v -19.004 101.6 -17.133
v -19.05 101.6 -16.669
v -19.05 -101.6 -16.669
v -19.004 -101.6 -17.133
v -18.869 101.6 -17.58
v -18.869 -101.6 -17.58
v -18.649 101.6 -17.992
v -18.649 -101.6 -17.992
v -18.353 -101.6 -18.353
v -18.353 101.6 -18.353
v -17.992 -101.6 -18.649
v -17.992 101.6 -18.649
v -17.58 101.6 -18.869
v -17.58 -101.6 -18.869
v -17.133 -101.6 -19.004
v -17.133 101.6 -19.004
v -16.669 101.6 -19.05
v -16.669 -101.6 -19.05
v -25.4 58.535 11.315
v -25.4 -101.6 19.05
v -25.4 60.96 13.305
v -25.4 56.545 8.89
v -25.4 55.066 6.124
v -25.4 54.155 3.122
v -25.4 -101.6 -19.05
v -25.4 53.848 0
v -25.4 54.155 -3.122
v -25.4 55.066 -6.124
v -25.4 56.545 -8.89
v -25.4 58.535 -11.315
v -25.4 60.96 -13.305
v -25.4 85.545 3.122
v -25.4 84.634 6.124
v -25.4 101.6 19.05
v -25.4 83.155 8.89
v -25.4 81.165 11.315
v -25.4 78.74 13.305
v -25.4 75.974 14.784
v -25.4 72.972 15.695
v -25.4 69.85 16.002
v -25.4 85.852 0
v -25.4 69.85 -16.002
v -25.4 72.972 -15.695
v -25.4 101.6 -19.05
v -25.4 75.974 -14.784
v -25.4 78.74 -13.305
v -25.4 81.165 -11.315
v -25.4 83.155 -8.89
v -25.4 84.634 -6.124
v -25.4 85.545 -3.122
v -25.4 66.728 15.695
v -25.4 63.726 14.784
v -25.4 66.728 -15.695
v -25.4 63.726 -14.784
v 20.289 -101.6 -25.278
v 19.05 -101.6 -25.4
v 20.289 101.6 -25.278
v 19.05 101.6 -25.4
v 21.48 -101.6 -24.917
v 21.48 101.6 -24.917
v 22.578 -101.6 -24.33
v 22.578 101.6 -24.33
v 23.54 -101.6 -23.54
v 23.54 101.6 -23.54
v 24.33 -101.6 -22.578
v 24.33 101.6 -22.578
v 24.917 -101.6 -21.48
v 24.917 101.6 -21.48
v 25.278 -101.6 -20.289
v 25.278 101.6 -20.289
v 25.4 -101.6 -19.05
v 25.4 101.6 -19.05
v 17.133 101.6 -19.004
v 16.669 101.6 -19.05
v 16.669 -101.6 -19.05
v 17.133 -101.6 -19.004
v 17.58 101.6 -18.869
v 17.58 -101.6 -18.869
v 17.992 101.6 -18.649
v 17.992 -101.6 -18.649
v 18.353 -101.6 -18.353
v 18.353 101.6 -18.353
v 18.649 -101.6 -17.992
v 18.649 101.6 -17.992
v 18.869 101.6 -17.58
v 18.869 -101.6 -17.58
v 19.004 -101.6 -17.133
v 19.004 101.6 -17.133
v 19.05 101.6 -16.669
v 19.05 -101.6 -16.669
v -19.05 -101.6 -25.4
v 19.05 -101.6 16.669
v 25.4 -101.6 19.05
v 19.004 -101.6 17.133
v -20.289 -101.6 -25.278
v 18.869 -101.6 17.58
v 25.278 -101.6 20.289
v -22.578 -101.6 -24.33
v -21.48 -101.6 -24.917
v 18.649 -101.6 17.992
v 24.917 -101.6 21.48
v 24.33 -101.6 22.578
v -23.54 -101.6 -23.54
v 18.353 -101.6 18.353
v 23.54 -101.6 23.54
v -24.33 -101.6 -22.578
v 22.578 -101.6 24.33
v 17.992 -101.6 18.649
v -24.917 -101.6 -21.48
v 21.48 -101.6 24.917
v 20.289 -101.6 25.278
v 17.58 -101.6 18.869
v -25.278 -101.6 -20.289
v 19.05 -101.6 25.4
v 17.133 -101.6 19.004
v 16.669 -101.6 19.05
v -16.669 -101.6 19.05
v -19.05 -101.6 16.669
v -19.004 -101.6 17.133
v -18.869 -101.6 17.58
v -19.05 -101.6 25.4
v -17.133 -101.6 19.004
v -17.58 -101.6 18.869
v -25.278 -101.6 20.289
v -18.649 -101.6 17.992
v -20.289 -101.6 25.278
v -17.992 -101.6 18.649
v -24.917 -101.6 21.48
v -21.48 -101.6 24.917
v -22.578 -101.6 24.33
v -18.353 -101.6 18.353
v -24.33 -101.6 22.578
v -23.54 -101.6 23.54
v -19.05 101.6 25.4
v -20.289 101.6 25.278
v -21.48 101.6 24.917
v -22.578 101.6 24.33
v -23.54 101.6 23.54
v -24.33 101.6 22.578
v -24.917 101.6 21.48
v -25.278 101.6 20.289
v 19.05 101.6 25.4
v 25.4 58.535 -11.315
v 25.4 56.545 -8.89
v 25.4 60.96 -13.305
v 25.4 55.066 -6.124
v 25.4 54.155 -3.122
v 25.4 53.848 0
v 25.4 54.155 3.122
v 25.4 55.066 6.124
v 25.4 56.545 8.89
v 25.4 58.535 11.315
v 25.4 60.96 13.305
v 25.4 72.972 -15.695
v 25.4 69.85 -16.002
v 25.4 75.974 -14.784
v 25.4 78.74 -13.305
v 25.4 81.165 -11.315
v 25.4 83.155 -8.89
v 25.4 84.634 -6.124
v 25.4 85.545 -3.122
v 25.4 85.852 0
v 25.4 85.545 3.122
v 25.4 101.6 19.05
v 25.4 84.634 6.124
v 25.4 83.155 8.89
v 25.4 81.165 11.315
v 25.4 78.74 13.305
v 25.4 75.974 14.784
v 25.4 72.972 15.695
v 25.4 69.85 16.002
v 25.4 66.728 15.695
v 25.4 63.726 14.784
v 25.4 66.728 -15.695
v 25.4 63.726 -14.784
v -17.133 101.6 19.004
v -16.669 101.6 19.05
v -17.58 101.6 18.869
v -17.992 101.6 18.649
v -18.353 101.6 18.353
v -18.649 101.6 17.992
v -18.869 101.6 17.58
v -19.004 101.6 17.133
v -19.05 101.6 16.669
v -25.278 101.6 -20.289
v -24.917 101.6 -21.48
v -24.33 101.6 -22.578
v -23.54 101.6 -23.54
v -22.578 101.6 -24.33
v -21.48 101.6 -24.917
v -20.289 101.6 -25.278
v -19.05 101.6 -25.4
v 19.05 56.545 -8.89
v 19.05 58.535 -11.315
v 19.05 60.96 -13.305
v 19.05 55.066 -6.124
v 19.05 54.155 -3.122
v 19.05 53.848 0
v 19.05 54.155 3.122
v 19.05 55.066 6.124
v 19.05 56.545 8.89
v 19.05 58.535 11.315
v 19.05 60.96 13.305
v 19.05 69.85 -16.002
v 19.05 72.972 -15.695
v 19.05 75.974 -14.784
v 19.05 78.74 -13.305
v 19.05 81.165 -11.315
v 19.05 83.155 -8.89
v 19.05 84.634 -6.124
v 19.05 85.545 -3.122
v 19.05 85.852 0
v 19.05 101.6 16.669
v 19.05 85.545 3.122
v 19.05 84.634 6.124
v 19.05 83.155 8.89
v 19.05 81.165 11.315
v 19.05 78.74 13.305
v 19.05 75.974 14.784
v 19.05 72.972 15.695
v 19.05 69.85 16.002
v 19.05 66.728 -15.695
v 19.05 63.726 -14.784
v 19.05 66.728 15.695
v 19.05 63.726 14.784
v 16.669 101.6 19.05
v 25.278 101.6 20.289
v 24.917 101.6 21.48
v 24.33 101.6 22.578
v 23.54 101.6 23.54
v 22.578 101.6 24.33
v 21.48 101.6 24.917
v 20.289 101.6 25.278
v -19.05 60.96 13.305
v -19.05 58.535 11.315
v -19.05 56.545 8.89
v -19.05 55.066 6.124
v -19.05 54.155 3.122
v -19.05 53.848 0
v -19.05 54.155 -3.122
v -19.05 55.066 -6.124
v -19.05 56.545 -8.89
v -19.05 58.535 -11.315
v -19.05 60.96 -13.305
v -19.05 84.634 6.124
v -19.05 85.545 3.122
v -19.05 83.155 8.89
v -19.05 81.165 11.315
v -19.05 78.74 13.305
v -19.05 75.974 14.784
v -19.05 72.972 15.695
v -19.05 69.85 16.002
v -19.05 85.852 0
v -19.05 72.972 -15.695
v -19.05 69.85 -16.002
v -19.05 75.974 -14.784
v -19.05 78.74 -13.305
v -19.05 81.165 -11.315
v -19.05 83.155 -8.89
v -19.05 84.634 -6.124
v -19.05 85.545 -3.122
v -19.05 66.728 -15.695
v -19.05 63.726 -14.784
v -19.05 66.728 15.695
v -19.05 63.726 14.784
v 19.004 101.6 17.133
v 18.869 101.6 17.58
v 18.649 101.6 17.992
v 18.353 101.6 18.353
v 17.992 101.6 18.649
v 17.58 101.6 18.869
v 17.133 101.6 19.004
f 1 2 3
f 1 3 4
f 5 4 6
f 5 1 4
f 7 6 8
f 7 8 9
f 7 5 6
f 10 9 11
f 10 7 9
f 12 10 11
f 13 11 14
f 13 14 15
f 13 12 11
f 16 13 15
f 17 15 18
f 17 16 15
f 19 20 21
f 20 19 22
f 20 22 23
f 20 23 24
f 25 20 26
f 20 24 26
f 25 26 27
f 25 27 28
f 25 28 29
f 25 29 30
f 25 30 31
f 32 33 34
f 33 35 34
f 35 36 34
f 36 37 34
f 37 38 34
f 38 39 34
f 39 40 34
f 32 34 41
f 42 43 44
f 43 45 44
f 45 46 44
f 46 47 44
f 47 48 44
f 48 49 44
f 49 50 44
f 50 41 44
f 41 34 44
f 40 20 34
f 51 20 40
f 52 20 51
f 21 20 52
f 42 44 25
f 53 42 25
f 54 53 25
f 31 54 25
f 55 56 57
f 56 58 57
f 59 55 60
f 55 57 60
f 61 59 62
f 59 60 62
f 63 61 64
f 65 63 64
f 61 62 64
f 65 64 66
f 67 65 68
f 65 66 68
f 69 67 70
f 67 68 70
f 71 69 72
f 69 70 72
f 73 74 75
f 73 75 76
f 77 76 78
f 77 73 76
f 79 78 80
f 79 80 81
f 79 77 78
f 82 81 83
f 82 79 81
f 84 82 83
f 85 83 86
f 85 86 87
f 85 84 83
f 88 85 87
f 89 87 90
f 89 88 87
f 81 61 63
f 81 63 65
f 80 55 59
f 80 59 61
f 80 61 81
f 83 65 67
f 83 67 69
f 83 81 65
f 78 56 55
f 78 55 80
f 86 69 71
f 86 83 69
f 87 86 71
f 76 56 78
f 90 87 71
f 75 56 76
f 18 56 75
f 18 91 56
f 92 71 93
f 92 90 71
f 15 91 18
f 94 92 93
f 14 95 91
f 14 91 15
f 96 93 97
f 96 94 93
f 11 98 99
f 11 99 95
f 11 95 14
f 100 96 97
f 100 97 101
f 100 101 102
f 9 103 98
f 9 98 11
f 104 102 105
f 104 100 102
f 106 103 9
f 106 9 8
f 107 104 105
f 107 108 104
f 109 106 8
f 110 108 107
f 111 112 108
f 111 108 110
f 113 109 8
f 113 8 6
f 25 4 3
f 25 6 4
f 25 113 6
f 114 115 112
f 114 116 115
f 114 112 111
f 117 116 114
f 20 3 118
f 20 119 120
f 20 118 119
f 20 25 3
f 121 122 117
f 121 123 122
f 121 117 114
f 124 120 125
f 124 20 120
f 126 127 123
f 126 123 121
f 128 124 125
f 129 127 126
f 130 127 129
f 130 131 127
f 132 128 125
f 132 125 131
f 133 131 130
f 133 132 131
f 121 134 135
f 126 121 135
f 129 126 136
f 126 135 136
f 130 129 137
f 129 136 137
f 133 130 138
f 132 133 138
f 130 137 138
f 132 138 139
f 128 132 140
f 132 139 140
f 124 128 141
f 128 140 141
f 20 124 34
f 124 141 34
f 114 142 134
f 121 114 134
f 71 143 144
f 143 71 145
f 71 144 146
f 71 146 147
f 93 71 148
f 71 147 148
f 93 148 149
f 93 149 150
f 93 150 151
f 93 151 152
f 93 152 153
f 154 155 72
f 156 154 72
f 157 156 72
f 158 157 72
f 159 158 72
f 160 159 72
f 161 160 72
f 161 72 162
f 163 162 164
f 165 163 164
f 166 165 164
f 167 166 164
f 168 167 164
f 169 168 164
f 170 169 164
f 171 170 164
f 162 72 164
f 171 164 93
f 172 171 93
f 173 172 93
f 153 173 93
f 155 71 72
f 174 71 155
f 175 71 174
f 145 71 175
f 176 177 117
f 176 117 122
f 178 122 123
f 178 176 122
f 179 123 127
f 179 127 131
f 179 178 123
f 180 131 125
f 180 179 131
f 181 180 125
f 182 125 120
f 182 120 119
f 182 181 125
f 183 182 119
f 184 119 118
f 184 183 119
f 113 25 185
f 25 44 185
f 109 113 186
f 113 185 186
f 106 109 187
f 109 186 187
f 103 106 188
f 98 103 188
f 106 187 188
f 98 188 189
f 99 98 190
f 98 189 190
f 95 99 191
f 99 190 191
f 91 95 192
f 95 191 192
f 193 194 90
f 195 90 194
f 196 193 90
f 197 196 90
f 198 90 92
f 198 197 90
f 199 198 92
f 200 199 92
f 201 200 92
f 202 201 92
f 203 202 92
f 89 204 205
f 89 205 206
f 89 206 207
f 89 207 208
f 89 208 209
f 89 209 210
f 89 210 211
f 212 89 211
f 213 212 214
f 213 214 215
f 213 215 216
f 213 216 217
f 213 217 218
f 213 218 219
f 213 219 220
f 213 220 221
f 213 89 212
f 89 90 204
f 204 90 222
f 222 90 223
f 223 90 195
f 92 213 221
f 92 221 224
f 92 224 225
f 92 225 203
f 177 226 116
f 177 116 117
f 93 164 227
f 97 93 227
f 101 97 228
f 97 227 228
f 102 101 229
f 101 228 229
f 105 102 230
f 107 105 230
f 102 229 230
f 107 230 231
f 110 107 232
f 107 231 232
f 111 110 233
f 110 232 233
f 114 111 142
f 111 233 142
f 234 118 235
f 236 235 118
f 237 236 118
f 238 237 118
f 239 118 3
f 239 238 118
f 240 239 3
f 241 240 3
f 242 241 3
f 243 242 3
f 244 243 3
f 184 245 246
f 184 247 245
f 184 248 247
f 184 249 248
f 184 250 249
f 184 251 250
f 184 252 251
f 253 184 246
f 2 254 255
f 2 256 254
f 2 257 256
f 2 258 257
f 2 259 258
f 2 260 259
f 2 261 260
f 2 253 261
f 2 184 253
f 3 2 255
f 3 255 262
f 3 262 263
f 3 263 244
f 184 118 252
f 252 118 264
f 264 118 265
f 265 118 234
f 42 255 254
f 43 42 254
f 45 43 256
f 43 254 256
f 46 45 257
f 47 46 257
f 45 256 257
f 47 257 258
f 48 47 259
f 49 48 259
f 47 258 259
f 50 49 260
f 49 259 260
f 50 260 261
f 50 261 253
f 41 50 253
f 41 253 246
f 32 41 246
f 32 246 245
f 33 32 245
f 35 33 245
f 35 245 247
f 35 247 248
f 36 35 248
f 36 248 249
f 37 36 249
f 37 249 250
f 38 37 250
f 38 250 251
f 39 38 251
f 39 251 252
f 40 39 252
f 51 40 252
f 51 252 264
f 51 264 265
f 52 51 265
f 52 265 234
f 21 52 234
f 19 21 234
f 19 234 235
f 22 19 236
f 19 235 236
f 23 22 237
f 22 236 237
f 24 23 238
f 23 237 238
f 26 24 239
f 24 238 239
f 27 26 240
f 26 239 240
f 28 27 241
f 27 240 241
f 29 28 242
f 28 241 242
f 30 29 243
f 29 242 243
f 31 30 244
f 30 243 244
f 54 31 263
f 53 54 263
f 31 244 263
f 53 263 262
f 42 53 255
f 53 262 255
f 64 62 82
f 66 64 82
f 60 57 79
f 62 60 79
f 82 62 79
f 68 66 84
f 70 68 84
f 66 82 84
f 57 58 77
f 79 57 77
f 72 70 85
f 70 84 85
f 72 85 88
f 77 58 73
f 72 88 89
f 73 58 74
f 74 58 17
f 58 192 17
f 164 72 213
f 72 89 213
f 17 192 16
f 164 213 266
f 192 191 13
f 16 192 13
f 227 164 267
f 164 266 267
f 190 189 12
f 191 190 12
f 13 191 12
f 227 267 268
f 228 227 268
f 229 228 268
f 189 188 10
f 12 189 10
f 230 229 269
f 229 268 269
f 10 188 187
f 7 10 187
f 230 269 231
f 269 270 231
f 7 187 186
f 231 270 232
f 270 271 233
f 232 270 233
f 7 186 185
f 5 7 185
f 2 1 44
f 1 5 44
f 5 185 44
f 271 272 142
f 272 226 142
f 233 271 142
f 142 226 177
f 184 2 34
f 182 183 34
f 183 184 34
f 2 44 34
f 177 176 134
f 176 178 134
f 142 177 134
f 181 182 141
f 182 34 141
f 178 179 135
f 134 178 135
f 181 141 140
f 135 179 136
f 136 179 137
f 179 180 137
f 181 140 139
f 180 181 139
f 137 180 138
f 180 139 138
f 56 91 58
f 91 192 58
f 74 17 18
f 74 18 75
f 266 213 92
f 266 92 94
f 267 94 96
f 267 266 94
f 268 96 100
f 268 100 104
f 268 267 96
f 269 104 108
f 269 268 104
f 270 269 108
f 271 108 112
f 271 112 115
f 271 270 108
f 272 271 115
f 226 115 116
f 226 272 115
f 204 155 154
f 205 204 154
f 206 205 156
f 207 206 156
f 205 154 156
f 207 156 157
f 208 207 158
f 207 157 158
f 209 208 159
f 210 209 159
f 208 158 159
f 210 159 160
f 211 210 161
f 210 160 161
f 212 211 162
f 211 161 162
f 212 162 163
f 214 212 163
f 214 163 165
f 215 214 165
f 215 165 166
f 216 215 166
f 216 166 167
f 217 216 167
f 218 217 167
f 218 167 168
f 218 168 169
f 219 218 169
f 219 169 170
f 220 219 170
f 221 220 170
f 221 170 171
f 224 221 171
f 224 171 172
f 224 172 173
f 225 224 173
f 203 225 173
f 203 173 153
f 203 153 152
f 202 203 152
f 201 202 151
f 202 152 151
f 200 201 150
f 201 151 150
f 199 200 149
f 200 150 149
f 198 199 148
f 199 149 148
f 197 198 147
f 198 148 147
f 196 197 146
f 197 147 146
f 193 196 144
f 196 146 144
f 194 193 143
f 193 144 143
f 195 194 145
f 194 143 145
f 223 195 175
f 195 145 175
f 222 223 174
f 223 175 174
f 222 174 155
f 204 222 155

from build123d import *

# Parameters (mm, degrees)
BOSS_EXTRUDE1_DEPTH = 101.6
SKETCH2_R           = 16.002
CUT_EXTRUDE1_DEPTH  = 51.8


with BuildPart() as part:
    # Sketch1 → Boss-Extrude1 (new body, symmetric)
    with BuildSketch(Plane(origin=(0, 0, 0), x_dir=(0, 0, -1), z_dir=(0, 1, 0))):
        with BuildLine():
            Line((-19.05, 25.4), (19.05, 25.4))
            ThreePointArc((19.05, 25.4), (23.540128061, 23.540128061), (25.4, 19.05))
            Line((25.4, 19.05), (25.4, -19.05))
            ThreePointArc((25.4, -19.05), (23.540128061, -23.540128061), (19.05, -25.4))
            Line((19.05, -25.4), (-19.05, -25.4))
            ThreePointArc((-19.05, -25.4), (-23.540128061, -23.540128061), (-25.4, -19.05))
            Line((-25.4, -19.05), (-25.4, 19.05))
            ThreePointArc((-25.4, 19.05), (-23.540128061, 23.540128061), (-19.05, 25.4))
        make_face()
        with BuildLine():
            Line((-16.66875, 19.05), (16.66875, 19.05))
            ThreePointArc((16.66875, 19.05), (18.352548023, 18.352548023), (19.05, 16.66875))
            Line((19.05, 16.66875), (19.05, -16.66875))
            ThreePointArc((19.05, -16.66875), (18.352548023, -18.352548023), (16.66875, -19.05))
            Line((16.66875, -19.05), (-16.66875, -19.05))
            ThreePointArc((-16.66875, -19.05), (-18.352548023, -18.352548023), (-19.05, -16.66875))
            Line((-19.05, -16.66875), (-19.05, 16.66875))
            ThreePointArc((-19.05, 16.66875), (-18.352548023, 18.352548023), (-16.66875, 19.05))
        make_face(mode=Mode.SUBTRACT)
    extrude(amount=BOSS_EXTRUDE1_DEPTH, both=True)

    # Sketch2 → Cut-Extrude1 (cut, through all)
    with BuildSketch(Plane(origin=(25.4, 0, 0), x_dir=(0, 0, -1), z_dir=(1, 0, 0))):
        with Locations((0, 69.85)):
            Circle(SKETCH2_R)
    extrude(amount=-CUT_EXTRUDE1_DEPTH, mode=Mode.SUBTRACT)


solid = part.part
